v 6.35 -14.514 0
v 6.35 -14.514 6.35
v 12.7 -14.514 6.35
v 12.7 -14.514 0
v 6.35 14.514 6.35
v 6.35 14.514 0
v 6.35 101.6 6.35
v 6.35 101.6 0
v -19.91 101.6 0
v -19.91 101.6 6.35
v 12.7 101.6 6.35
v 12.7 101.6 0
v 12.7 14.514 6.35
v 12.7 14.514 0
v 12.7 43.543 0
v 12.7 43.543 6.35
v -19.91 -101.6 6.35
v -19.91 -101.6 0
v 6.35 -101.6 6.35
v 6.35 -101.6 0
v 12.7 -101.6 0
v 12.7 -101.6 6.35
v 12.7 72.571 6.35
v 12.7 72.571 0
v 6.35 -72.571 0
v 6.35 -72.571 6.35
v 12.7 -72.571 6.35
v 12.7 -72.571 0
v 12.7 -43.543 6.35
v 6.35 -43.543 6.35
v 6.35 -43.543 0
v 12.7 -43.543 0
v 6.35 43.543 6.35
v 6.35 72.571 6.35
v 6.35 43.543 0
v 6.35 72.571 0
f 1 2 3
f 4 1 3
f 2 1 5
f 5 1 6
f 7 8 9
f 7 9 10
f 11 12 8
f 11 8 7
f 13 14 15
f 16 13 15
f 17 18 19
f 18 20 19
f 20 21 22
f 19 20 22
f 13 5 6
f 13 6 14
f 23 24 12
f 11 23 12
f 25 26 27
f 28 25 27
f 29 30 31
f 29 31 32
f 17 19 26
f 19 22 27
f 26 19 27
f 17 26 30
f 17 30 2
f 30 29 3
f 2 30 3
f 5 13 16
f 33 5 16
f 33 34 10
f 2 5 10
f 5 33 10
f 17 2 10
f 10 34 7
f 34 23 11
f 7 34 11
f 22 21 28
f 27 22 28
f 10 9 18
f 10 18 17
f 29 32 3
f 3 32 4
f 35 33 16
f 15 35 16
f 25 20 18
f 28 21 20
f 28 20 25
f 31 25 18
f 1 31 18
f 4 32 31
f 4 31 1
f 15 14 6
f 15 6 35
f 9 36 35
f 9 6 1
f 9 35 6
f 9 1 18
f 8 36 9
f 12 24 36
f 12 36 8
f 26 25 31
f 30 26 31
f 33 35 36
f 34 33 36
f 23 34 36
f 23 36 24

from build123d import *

# Parameters (mm, degrees)
SKETCH1_W           = 6.35
SKETCH1_H           = 203.2
SKETCH1_H_2         = 29.028571429
BOSS_EXTRUDE1_DEPTH = 6.35
SKETCH2_W           = 6.35
SKETCH2_H           = 203.2
BOSS_EXTRUDE2_DEPTH = 13.56


with BuildPart() as part:
    # Sketch1 → Boss-Extrude1 (new body)
    with BuildSketch(Plane.XY):
        with Locations((-3.175, 0)):
            Rectangle(SKETCH1_W, SKETCH1_H)
        Polygon((6.35, 101.6), (0, 101.6), (0, -101.6), (6.35, -101.6), (6.35, -72.571428571), (6.35, -43.542857143), (6.35, -14.514285714), (6.35, 14.514285714), (6.35, 43.542857143), (6.35, 72.571428571), align=None)
        with Locations((9.525, 87.085714286)):
            Rectangle(SKETCH1_W, SKETCH1_H_2)
        with Locations((9.525, 29.028571429)):
            Rectangle(SKETCH1_W, SKETCH1_H_2)
        with Locations((9.525, -29.028571429)):
            Rectangle(SKETCH1_W, SKETCH1_H_2)
        with Locations((9.525, -87.085714286)):
            Rectangle(SKETCH1_W, SKETCH1_H_2)
    extrude(amount=BOSS_EXTRUDE1_DEPTH)

    # Sketch2 → Boss-Extrude2 (add)
    with BuildSketch(Plane.ZY.offset(6.35)):
        with Locations((3.175, 0)):
            Rectangle(SKETCH2_W, SKETCH2_H)
    extrude(amount=BOSS_EXTRUDE2_DEPTH)


solid = part.part
